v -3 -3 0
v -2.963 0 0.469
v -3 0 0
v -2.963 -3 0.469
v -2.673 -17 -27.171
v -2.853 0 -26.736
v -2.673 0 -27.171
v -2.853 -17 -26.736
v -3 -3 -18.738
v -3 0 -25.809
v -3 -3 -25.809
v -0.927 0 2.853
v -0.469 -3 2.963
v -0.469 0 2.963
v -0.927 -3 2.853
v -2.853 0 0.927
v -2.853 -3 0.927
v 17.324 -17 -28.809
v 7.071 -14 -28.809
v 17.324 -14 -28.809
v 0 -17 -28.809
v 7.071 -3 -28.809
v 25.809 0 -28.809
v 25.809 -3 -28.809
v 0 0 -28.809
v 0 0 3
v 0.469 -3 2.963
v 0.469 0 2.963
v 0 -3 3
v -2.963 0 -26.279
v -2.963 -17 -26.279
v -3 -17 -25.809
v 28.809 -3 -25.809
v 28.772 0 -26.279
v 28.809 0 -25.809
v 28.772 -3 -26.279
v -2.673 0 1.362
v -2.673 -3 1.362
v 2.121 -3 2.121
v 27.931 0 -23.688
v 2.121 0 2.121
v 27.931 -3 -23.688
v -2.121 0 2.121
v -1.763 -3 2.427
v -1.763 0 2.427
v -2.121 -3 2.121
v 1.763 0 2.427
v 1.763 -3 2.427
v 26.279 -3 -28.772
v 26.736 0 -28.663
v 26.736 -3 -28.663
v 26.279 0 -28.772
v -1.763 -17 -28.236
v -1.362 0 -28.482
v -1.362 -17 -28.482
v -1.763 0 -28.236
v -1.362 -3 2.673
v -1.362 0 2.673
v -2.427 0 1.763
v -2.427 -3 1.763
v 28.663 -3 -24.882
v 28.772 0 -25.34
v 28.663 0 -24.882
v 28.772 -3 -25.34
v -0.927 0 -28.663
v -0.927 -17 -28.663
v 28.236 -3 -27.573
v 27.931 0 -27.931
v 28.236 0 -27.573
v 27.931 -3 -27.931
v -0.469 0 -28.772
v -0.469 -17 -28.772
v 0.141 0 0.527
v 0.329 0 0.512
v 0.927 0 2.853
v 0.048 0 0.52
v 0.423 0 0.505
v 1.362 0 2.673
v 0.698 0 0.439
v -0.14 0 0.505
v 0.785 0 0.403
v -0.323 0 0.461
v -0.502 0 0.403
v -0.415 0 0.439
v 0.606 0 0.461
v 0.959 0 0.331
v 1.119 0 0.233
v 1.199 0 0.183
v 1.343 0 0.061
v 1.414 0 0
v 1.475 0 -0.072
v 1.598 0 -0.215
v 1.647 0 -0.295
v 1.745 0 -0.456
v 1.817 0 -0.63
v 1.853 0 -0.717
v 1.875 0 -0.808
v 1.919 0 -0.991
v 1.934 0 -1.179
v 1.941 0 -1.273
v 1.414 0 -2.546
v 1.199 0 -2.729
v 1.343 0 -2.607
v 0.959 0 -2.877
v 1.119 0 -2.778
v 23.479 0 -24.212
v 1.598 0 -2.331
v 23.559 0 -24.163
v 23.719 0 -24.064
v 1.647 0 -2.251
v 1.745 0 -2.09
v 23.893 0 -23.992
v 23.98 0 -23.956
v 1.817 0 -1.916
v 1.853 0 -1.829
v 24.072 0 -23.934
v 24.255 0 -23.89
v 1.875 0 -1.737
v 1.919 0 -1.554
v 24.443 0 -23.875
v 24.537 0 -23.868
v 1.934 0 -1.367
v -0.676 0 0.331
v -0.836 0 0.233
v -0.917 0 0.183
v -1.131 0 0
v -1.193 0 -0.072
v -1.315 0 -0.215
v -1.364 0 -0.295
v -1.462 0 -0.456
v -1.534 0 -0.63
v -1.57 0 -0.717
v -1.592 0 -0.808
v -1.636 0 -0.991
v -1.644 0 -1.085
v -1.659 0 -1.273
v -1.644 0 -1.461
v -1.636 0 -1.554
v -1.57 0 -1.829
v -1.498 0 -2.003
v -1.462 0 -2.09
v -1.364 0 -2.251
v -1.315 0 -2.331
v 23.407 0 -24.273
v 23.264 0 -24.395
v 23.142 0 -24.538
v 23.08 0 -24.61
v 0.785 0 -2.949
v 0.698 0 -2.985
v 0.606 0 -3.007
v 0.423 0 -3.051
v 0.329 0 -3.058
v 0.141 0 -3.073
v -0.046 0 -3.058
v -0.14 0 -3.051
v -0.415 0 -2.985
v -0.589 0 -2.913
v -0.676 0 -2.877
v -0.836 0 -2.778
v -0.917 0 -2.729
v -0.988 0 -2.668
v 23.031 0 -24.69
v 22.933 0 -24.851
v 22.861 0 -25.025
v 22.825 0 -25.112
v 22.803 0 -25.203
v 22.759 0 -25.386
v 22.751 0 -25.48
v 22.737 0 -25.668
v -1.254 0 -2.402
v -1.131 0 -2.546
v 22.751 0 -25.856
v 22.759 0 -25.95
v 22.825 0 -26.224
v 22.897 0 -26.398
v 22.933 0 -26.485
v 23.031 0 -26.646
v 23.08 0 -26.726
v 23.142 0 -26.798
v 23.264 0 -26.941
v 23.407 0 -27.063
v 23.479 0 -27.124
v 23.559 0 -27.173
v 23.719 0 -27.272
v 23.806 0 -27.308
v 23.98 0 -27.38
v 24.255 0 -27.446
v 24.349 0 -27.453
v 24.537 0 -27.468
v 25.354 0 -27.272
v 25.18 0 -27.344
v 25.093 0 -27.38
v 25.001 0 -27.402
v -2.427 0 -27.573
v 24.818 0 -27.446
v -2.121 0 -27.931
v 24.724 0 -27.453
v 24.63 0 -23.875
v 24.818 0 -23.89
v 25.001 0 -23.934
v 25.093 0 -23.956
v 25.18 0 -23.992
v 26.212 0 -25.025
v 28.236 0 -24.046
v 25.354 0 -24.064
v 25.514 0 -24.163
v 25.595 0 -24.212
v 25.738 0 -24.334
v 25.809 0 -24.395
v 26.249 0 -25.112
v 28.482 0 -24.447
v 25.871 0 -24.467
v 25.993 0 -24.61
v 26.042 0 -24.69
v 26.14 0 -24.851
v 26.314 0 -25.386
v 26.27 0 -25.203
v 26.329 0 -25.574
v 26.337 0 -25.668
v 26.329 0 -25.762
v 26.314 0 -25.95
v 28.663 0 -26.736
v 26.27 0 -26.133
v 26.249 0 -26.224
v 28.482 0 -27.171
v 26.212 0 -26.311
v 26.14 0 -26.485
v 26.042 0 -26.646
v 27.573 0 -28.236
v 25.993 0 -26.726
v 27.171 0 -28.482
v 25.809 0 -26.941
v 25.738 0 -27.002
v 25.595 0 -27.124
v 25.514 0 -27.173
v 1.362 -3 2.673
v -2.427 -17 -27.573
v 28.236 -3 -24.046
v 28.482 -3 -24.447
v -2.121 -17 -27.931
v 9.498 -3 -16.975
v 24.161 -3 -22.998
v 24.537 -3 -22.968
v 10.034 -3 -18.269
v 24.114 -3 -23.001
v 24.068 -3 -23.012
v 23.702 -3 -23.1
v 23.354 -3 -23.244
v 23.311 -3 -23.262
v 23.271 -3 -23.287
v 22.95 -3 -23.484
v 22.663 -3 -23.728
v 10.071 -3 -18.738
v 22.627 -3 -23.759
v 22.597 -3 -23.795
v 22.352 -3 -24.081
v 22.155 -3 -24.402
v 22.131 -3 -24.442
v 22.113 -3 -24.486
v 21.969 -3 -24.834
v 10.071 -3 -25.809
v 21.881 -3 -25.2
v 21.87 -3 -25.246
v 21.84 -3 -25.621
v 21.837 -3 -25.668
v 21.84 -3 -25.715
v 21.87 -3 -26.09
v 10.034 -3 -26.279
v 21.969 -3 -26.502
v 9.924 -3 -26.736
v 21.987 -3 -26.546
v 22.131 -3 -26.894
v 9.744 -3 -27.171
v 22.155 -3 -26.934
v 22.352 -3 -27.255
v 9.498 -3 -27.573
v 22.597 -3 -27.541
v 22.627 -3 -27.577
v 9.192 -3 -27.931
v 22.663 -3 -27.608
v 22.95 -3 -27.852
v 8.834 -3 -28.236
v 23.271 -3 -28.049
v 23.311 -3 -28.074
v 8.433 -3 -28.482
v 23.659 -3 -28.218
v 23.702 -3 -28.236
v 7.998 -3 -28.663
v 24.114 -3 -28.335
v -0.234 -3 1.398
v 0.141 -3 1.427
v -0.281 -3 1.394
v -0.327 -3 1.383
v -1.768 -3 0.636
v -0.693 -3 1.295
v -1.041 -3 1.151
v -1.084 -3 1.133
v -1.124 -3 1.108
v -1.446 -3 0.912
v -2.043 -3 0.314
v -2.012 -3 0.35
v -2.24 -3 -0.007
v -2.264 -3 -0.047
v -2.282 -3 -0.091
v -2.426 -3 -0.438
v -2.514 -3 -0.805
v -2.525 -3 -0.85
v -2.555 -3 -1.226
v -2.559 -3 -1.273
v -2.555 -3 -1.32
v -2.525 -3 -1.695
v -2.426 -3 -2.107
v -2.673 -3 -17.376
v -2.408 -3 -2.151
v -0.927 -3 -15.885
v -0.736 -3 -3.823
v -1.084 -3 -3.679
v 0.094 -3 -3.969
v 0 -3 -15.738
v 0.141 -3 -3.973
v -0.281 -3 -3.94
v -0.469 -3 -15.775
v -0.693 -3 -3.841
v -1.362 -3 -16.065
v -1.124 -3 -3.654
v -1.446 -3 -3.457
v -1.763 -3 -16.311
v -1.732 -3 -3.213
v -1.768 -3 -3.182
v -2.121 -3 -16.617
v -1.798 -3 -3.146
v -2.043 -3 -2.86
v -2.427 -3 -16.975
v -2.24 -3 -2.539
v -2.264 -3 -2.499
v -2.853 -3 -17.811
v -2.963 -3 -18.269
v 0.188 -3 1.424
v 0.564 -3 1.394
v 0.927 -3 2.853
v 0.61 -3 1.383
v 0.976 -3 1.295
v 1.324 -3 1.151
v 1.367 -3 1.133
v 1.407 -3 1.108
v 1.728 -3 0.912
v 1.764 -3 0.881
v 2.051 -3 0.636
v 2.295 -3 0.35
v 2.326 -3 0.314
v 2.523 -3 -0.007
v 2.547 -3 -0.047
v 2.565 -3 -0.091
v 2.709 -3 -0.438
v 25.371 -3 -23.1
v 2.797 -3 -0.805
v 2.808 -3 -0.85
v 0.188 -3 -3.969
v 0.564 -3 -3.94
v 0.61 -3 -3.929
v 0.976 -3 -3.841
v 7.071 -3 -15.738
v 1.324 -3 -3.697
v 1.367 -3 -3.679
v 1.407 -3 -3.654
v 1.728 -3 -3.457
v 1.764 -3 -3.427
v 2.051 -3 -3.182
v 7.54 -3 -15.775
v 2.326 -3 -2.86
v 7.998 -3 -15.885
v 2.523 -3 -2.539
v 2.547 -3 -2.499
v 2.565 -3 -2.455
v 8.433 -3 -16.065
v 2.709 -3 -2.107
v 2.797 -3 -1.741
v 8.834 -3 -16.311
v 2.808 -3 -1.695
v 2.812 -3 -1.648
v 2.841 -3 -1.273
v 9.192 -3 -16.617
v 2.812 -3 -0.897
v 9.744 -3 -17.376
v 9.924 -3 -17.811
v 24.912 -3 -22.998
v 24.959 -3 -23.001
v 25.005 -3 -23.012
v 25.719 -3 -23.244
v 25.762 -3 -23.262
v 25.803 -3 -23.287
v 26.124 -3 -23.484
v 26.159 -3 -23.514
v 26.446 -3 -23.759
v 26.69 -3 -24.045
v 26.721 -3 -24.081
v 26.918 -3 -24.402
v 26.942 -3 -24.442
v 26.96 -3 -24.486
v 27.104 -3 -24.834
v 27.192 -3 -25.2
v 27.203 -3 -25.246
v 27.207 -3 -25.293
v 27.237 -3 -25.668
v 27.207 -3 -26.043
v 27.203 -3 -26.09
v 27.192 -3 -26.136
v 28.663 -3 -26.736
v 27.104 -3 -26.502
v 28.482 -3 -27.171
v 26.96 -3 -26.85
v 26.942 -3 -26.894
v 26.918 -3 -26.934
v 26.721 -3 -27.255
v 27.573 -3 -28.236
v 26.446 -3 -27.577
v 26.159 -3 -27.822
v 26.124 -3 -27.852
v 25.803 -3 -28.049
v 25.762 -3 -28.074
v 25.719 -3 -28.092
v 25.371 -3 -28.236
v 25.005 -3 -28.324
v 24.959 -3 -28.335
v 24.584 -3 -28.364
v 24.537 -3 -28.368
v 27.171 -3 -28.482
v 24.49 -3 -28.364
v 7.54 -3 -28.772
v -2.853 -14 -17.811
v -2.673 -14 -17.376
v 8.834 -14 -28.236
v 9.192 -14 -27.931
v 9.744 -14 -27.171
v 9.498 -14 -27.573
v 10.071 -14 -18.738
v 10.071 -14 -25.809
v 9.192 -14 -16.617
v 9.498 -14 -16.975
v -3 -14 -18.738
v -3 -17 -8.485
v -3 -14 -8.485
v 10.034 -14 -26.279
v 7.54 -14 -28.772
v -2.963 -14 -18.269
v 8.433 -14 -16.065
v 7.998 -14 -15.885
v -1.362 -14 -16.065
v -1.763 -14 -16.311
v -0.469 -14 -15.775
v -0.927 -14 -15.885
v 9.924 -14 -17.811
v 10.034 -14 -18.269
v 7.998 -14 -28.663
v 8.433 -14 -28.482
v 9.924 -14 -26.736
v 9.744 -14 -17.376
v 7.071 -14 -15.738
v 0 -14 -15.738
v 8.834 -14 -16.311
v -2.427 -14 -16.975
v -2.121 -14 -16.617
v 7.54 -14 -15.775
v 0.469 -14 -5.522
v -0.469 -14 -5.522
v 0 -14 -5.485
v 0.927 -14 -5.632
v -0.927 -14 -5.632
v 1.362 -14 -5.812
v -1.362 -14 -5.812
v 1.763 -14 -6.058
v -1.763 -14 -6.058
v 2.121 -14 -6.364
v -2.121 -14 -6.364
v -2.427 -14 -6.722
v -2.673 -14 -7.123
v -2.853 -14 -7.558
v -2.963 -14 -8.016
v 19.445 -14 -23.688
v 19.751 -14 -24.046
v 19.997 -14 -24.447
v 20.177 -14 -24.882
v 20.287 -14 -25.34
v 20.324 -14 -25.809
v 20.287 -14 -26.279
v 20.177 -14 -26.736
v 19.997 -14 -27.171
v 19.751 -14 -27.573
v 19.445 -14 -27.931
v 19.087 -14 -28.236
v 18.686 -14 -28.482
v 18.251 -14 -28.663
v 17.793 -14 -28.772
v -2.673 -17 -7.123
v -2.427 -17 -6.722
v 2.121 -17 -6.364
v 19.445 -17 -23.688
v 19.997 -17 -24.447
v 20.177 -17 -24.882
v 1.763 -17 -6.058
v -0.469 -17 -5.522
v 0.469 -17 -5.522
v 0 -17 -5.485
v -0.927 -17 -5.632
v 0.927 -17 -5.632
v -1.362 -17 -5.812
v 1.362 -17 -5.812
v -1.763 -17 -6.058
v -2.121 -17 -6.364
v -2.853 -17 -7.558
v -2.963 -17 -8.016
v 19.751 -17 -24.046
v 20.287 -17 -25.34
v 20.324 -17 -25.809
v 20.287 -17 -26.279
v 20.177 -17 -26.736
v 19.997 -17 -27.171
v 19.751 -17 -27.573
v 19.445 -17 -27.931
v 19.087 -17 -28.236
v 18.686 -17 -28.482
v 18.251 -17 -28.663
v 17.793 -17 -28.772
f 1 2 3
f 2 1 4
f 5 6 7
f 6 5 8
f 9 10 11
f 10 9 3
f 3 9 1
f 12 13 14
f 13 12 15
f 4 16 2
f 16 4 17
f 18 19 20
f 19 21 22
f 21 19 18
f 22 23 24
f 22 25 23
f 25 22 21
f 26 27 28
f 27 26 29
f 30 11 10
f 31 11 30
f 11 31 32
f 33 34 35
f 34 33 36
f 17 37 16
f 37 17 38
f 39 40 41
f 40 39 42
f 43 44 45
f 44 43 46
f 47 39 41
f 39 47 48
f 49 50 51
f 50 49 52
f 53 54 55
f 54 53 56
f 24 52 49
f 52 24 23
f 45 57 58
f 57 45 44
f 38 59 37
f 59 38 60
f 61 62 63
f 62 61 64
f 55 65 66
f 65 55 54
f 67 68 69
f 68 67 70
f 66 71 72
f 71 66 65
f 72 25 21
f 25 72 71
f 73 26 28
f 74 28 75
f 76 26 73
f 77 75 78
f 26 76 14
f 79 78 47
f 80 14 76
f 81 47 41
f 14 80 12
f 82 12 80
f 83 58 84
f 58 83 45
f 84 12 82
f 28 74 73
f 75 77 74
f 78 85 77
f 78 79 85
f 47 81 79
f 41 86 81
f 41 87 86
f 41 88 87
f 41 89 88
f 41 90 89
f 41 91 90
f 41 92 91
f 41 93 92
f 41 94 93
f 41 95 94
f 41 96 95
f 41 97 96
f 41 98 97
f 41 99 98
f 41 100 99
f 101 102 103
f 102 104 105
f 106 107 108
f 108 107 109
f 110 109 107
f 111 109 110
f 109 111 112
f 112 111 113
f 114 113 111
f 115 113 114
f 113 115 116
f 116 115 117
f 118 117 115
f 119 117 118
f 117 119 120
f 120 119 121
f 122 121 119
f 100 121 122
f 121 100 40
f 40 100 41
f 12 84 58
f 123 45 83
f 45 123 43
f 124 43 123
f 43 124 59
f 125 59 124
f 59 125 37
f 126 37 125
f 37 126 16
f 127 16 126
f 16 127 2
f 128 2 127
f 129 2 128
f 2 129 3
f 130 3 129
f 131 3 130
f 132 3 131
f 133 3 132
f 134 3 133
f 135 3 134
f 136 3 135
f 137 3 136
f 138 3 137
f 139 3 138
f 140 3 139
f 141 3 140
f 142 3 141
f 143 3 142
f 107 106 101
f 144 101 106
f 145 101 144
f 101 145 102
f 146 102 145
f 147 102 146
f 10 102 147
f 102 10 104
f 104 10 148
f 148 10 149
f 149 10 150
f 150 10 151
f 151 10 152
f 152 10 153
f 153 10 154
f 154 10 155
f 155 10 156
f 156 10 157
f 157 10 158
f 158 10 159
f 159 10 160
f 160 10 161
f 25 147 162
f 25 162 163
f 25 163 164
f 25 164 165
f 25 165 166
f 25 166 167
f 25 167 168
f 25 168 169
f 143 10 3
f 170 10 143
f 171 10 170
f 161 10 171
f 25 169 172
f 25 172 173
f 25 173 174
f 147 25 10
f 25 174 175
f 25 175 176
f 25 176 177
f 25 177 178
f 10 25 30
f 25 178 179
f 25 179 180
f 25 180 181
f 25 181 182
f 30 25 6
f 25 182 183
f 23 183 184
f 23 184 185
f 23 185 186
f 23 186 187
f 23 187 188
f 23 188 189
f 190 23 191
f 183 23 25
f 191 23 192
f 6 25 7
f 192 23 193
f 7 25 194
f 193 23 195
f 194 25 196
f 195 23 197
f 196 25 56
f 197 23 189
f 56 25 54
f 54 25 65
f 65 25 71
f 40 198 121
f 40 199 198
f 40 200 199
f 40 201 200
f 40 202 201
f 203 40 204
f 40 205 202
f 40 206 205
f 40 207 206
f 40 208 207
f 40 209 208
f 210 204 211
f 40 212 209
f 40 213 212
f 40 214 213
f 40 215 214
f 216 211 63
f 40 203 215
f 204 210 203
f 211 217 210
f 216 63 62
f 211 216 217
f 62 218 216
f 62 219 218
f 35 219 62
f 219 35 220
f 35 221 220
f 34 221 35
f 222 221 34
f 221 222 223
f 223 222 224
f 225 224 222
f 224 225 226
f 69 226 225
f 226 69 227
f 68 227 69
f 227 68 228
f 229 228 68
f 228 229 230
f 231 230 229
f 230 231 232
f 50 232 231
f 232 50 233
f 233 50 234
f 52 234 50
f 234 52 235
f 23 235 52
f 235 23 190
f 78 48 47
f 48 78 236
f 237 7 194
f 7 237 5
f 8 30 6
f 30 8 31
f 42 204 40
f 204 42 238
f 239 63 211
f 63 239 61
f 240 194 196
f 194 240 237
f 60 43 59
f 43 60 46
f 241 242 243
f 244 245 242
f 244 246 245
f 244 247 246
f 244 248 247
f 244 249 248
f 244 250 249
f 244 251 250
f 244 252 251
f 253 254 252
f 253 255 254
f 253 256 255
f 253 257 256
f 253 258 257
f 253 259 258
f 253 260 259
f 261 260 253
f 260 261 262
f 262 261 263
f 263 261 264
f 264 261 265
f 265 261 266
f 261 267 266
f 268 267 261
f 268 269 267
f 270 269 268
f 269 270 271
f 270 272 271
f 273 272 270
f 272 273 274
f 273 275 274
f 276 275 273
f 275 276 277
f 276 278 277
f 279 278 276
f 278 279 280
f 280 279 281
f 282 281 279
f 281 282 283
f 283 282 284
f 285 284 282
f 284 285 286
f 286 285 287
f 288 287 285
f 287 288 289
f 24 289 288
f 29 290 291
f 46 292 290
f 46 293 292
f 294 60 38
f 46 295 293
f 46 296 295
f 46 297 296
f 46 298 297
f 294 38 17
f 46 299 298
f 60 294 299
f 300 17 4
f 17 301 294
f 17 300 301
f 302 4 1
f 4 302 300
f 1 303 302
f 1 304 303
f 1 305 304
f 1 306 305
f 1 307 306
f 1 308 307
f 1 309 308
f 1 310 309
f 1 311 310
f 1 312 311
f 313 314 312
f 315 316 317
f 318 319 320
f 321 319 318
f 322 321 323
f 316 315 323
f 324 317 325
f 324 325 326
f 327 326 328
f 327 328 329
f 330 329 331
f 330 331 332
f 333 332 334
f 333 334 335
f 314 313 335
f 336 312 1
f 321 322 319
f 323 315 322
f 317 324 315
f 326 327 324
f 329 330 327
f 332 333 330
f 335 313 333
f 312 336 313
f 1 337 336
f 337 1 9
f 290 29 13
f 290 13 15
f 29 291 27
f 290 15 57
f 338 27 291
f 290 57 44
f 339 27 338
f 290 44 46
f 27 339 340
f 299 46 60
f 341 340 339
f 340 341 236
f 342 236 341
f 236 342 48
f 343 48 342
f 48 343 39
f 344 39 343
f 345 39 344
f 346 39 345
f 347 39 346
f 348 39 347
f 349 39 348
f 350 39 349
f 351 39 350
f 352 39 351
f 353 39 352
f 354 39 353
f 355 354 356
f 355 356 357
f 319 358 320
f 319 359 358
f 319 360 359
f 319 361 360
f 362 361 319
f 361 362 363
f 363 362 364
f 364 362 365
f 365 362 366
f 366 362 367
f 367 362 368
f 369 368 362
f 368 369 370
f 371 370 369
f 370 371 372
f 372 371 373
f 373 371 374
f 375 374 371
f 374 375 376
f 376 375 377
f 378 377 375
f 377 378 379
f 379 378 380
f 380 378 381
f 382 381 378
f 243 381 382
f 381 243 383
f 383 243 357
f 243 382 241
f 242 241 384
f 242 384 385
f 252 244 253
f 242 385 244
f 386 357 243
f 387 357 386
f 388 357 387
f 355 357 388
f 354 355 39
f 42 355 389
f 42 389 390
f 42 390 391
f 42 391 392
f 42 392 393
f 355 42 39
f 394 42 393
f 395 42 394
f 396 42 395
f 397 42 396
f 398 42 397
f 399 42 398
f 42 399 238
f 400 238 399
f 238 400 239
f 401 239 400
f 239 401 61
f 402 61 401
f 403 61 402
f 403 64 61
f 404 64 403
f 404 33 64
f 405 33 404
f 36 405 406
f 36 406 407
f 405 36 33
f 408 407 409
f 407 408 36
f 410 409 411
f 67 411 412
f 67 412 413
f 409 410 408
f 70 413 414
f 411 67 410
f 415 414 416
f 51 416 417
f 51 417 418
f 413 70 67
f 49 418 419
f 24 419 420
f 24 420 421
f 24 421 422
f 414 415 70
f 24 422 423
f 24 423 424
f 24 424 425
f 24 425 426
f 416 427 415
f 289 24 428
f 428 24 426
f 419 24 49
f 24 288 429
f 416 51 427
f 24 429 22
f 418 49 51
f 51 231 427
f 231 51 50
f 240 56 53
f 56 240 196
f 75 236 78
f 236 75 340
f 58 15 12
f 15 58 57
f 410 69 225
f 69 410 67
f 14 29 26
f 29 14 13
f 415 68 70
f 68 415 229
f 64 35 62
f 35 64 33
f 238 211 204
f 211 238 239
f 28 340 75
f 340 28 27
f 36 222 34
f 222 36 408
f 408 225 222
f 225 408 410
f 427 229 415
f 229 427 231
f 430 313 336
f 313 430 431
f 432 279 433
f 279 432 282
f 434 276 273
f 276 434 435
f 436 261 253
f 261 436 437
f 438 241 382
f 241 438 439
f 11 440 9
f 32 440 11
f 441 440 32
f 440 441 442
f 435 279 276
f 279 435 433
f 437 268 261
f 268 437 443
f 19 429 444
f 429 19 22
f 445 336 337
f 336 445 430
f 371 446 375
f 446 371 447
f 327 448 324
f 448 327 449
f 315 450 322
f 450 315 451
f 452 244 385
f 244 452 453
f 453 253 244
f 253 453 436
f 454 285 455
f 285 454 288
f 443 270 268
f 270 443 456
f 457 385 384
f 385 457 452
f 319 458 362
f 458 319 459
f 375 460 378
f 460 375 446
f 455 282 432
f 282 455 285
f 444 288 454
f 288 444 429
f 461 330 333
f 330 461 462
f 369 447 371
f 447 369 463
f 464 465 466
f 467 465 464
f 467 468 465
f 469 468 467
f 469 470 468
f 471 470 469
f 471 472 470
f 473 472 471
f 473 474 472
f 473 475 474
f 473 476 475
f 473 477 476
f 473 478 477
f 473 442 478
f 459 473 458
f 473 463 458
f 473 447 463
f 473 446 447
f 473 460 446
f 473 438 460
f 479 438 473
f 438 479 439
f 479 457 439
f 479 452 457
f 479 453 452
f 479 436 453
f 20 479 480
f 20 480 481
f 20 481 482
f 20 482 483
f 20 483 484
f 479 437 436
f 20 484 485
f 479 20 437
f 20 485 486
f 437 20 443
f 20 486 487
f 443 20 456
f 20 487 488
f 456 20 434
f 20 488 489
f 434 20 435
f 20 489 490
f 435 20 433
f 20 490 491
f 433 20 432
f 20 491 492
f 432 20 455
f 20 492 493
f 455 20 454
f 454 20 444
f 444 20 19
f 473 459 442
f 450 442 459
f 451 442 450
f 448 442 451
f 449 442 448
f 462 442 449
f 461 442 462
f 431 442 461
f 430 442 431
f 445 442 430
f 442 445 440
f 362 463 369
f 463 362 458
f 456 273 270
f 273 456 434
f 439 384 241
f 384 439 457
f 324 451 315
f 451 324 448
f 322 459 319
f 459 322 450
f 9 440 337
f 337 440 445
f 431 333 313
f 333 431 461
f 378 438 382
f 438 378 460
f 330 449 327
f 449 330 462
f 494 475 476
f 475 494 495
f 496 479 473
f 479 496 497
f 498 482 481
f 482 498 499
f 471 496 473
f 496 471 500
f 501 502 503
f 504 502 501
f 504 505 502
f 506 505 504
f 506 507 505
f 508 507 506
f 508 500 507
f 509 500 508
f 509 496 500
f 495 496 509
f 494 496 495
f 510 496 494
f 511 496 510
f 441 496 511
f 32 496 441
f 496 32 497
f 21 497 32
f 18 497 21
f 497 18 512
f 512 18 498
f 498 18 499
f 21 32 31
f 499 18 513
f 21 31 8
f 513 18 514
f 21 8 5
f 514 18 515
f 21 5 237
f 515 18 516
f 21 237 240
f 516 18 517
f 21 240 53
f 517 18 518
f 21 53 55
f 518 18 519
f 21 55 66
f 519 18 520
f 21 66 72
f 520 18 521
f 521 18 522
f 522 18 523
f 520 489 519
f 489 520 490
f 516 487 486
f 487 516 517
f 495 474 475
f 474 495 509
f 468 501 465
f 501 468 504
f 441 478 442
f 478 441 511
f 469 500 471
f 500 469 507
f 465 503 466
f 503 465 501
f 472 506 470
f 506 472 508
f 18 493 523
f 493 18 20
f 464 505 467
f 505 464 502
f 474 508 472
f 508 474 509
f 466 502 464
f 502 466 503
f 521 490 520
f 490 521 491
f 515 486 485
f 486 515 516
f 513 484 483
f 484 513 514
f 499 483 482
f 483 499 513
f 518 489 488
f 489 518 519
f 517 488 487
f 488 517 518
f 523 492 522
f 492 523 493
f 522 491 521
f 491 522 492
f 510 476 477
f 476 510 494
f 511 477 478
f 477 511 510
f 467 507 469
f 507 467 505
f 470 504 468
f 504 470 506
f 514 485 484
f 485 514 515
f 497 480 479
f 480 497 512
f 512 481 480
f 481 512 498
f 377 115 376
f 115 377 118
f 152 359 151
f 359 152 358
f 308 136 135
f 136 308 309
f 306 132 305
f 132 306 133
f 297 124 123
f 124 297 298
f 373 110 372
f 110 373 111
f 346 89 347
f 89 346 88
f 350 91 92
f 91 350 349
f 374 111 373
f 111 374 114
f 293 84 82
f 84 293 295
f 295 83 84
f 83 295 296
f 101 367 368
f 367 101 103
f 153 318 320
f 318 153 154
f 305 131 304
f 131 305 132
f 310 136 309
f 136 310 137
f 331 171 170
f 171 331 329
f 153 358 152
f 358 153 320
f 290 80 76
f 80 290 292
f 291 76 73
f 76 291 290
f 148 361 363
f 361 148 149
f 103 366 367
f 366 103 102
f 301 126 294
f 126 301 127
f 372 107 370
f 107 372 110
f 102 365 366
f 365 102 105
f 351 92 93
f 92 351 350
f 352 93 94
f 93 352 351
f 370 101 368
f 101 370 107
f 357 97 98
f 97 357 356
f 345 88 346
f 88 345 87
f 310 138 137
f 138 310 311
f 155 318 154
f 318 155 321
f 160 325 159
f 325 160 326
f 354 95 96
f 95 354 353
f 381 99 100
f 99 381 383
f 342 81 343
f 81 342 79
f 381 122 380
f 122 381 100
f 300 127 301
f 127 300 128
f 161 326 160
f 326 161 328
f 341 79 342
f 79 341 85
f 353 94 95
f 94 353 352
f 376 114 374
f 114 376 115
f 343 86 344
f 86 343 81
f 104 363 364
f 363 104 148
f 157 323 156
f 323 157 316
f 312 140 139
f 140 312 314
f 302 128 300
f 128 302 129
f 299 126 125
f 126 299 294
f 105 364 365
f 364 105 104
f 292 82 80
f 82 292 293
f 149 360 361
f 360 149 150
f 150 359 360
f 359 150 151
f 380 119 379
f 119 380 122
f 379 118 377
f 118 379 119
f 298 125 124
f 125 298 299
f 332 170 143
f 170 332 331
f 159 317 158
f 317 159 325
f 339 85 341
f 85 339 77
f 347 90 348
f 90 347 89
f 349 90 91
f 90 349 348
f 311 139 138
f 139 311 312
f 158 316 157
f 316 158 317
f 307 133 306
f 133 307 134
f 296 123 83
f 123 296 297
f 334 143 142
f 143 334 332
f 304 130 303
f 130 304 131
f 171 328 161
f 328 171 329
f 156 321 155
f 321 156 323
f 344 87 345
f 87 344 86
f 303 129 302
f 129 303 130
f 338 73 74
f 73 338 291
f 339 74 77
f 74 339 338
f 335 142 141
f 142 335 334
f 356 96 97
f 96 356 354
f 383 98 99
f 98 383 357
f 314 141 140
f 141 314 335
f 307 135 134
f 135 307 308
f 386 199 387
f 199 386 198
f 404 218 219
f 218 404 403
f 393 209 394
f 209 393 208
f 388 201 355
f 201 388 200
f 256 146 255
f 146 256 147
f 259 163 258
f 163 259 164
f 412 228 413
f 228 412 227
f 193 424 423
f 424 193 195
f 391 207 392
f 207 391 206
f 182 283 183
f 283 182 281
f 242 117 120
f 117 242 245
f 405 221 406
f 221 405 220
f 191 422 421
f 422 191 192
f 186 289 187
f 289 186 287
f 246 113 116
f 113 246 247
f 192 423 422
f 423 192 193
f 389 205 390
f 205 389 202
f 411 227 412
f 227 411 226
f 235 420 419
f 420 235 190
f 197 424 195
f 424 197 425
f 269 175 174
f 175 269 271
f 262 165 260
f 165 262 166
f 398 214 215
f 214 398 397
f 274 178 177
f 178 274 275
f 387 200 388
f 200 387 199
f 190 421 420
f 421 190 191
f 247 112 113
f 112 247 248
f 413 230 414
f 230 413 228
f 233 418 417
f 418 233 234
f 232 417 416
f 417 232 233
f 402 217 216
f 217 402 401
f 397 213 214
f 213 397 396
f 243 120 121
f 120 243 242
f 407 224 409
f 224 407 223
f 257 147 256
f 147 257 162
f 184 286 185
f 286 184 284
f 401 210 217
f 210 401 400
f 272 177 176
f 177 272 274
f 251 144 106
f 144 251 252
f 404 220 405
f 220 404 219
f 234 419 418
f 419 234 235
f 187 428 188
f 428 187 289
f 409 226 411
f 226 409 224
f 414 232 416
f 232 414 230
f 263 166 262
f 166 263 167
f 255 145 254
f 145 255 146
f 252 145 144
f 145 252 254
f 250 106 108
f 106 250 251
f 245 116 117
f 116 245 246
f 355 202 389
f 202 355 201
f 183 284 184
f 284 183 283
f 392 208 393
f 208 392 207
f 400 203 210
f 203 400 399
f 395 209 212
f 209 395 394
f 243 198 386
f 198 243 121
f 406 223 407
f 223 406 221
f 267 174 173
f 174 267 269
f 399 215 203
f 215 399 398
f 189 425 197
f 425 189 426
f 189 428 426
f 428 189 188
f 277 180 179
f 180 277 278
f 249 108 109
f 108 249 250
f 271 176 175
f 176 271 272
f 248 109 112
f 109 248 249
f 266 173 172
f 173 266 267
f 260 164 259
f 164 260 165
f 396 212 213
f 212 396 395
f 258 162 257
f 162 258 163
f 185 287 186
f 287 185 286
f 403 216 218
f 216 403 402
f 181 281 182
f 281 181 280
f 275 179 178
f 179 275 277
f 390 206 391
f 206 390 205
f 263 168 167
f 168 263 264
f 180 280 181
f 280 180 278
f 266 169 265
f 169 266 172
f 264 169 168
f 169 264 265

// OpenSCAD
// [FL_INDEX: keywords="openscad, 3d_parametric, Tool_Holder_Pliers_customizable, csg_solid" | COT="Parametric OpenSCAD design from 3DCodeverse"]
// Title: Tool Holder Pliers customizable

screw_holes = 3;//[2:20]
tool_handle_thickness=11;//[5:100]
tool_handle_inside_gape=10;//[3:50]
thickness=3;//[2:10]
/* [Hidden] */
$fn=40; 


rotate([90,45,0]){
difference() {
union() {
hull(){
translate([0,0,0])cylinder(h=thickness,r=screw_holes);
translate([(tool_handle_thickness*2)+(screw_holes*1.5)+tool_handle_inside_gape,0,0])cylinder(h=thickness,r=screw_holes);
translate([((tool_handle_thickness*2)+(screw_holes*1.5)+tool_handle_inside_gape)/2,-((tool_handle_thickness*2)+(screw_holes*1.5)+tool_handle_inside_gape)/2,0])cylinder(h=thickness,r=screw_holes);
}


hull(){
translate([((tool_handle_thickness*2)+(screw_holes*1.5)+tool_handle_inside_gape)/2,-((tool_handle_thickness*2)+(screw_holes*1.5)+tool_handle_inside_gape)/2,thickness])cylinder(h=tool_handle_thickness,r=screw_holes);

translate([((tool_handle_thickness*2)+(screw_holes*1.5)+tool_handle_inside_gape)/2-tool_handle_inside_gape/2,-((tool_handle_thickness*2)+(screw_holes*1.5)+tool_handle_inside_gape)/2+tool_handle_inside_gape/2,thickness])cylinder(h=tool_handle_thickness,r=screw_holes);

translate([((tool_handle_thickness*2)+(screw_holes*1.5)+tool_handle_inside_gape)/2+tool_handle_inside_gape/2,-((tool_handle_thickness*2)+(screw_holes*1.5)+tool_handle_inside_gape)/2+tool_handle_inside_gape/2,thickness])cylinder(h=tool_handle_thickness,r=screw_holes);

translate([((tool_handle_thickness*2)+(screw_holes*1.5)+tool_handle_inside_gape)/2,-((tool_handle_thickness*2)+(screw_holes*1.5)+tool_handle_inside_gape)/2+tool_handle_inside_gape,thickness])cylinder(h=tool_handle_thickness,r=screw_holes);

}

hull(){
translate([screw_holes*2,-screw_holes*2,tool_handle_thickness+thickness])cylinder(h=thickness,r=screw_holes);
translate([(tool_handle_thickness*2)+(screw_holes*1.5)+tool_handle_inside_gape-screw_holes*2,-screw_holes*2,tool_handle_thickness+thickness])cylinder(h=thickness,r=screw_holes);
translate([((tool_handle_thickness*2)+(screw_holes*1.5)+tool_handle_inside_gape)/2,-((tool_handle_thickness*2)+(screw_holes*1.5)+tool_handle_inside_gape)/2,tool_handle_thickness+thickness])cylinder(h=thickness,r=screw_holes);
}
}
translate([1,-.8,-1])cylinder(h=thickness+2,r1=screw_holes/2,r2=screw_holes);
translate([(tool_handle_thickness*2)+(screw_holes*1.5)+tool_handle_inside_gape-1,-.8,-1])cylinder(h=thickness+2,r1=screw_holes/2,r2=screw_holes);
}
}
